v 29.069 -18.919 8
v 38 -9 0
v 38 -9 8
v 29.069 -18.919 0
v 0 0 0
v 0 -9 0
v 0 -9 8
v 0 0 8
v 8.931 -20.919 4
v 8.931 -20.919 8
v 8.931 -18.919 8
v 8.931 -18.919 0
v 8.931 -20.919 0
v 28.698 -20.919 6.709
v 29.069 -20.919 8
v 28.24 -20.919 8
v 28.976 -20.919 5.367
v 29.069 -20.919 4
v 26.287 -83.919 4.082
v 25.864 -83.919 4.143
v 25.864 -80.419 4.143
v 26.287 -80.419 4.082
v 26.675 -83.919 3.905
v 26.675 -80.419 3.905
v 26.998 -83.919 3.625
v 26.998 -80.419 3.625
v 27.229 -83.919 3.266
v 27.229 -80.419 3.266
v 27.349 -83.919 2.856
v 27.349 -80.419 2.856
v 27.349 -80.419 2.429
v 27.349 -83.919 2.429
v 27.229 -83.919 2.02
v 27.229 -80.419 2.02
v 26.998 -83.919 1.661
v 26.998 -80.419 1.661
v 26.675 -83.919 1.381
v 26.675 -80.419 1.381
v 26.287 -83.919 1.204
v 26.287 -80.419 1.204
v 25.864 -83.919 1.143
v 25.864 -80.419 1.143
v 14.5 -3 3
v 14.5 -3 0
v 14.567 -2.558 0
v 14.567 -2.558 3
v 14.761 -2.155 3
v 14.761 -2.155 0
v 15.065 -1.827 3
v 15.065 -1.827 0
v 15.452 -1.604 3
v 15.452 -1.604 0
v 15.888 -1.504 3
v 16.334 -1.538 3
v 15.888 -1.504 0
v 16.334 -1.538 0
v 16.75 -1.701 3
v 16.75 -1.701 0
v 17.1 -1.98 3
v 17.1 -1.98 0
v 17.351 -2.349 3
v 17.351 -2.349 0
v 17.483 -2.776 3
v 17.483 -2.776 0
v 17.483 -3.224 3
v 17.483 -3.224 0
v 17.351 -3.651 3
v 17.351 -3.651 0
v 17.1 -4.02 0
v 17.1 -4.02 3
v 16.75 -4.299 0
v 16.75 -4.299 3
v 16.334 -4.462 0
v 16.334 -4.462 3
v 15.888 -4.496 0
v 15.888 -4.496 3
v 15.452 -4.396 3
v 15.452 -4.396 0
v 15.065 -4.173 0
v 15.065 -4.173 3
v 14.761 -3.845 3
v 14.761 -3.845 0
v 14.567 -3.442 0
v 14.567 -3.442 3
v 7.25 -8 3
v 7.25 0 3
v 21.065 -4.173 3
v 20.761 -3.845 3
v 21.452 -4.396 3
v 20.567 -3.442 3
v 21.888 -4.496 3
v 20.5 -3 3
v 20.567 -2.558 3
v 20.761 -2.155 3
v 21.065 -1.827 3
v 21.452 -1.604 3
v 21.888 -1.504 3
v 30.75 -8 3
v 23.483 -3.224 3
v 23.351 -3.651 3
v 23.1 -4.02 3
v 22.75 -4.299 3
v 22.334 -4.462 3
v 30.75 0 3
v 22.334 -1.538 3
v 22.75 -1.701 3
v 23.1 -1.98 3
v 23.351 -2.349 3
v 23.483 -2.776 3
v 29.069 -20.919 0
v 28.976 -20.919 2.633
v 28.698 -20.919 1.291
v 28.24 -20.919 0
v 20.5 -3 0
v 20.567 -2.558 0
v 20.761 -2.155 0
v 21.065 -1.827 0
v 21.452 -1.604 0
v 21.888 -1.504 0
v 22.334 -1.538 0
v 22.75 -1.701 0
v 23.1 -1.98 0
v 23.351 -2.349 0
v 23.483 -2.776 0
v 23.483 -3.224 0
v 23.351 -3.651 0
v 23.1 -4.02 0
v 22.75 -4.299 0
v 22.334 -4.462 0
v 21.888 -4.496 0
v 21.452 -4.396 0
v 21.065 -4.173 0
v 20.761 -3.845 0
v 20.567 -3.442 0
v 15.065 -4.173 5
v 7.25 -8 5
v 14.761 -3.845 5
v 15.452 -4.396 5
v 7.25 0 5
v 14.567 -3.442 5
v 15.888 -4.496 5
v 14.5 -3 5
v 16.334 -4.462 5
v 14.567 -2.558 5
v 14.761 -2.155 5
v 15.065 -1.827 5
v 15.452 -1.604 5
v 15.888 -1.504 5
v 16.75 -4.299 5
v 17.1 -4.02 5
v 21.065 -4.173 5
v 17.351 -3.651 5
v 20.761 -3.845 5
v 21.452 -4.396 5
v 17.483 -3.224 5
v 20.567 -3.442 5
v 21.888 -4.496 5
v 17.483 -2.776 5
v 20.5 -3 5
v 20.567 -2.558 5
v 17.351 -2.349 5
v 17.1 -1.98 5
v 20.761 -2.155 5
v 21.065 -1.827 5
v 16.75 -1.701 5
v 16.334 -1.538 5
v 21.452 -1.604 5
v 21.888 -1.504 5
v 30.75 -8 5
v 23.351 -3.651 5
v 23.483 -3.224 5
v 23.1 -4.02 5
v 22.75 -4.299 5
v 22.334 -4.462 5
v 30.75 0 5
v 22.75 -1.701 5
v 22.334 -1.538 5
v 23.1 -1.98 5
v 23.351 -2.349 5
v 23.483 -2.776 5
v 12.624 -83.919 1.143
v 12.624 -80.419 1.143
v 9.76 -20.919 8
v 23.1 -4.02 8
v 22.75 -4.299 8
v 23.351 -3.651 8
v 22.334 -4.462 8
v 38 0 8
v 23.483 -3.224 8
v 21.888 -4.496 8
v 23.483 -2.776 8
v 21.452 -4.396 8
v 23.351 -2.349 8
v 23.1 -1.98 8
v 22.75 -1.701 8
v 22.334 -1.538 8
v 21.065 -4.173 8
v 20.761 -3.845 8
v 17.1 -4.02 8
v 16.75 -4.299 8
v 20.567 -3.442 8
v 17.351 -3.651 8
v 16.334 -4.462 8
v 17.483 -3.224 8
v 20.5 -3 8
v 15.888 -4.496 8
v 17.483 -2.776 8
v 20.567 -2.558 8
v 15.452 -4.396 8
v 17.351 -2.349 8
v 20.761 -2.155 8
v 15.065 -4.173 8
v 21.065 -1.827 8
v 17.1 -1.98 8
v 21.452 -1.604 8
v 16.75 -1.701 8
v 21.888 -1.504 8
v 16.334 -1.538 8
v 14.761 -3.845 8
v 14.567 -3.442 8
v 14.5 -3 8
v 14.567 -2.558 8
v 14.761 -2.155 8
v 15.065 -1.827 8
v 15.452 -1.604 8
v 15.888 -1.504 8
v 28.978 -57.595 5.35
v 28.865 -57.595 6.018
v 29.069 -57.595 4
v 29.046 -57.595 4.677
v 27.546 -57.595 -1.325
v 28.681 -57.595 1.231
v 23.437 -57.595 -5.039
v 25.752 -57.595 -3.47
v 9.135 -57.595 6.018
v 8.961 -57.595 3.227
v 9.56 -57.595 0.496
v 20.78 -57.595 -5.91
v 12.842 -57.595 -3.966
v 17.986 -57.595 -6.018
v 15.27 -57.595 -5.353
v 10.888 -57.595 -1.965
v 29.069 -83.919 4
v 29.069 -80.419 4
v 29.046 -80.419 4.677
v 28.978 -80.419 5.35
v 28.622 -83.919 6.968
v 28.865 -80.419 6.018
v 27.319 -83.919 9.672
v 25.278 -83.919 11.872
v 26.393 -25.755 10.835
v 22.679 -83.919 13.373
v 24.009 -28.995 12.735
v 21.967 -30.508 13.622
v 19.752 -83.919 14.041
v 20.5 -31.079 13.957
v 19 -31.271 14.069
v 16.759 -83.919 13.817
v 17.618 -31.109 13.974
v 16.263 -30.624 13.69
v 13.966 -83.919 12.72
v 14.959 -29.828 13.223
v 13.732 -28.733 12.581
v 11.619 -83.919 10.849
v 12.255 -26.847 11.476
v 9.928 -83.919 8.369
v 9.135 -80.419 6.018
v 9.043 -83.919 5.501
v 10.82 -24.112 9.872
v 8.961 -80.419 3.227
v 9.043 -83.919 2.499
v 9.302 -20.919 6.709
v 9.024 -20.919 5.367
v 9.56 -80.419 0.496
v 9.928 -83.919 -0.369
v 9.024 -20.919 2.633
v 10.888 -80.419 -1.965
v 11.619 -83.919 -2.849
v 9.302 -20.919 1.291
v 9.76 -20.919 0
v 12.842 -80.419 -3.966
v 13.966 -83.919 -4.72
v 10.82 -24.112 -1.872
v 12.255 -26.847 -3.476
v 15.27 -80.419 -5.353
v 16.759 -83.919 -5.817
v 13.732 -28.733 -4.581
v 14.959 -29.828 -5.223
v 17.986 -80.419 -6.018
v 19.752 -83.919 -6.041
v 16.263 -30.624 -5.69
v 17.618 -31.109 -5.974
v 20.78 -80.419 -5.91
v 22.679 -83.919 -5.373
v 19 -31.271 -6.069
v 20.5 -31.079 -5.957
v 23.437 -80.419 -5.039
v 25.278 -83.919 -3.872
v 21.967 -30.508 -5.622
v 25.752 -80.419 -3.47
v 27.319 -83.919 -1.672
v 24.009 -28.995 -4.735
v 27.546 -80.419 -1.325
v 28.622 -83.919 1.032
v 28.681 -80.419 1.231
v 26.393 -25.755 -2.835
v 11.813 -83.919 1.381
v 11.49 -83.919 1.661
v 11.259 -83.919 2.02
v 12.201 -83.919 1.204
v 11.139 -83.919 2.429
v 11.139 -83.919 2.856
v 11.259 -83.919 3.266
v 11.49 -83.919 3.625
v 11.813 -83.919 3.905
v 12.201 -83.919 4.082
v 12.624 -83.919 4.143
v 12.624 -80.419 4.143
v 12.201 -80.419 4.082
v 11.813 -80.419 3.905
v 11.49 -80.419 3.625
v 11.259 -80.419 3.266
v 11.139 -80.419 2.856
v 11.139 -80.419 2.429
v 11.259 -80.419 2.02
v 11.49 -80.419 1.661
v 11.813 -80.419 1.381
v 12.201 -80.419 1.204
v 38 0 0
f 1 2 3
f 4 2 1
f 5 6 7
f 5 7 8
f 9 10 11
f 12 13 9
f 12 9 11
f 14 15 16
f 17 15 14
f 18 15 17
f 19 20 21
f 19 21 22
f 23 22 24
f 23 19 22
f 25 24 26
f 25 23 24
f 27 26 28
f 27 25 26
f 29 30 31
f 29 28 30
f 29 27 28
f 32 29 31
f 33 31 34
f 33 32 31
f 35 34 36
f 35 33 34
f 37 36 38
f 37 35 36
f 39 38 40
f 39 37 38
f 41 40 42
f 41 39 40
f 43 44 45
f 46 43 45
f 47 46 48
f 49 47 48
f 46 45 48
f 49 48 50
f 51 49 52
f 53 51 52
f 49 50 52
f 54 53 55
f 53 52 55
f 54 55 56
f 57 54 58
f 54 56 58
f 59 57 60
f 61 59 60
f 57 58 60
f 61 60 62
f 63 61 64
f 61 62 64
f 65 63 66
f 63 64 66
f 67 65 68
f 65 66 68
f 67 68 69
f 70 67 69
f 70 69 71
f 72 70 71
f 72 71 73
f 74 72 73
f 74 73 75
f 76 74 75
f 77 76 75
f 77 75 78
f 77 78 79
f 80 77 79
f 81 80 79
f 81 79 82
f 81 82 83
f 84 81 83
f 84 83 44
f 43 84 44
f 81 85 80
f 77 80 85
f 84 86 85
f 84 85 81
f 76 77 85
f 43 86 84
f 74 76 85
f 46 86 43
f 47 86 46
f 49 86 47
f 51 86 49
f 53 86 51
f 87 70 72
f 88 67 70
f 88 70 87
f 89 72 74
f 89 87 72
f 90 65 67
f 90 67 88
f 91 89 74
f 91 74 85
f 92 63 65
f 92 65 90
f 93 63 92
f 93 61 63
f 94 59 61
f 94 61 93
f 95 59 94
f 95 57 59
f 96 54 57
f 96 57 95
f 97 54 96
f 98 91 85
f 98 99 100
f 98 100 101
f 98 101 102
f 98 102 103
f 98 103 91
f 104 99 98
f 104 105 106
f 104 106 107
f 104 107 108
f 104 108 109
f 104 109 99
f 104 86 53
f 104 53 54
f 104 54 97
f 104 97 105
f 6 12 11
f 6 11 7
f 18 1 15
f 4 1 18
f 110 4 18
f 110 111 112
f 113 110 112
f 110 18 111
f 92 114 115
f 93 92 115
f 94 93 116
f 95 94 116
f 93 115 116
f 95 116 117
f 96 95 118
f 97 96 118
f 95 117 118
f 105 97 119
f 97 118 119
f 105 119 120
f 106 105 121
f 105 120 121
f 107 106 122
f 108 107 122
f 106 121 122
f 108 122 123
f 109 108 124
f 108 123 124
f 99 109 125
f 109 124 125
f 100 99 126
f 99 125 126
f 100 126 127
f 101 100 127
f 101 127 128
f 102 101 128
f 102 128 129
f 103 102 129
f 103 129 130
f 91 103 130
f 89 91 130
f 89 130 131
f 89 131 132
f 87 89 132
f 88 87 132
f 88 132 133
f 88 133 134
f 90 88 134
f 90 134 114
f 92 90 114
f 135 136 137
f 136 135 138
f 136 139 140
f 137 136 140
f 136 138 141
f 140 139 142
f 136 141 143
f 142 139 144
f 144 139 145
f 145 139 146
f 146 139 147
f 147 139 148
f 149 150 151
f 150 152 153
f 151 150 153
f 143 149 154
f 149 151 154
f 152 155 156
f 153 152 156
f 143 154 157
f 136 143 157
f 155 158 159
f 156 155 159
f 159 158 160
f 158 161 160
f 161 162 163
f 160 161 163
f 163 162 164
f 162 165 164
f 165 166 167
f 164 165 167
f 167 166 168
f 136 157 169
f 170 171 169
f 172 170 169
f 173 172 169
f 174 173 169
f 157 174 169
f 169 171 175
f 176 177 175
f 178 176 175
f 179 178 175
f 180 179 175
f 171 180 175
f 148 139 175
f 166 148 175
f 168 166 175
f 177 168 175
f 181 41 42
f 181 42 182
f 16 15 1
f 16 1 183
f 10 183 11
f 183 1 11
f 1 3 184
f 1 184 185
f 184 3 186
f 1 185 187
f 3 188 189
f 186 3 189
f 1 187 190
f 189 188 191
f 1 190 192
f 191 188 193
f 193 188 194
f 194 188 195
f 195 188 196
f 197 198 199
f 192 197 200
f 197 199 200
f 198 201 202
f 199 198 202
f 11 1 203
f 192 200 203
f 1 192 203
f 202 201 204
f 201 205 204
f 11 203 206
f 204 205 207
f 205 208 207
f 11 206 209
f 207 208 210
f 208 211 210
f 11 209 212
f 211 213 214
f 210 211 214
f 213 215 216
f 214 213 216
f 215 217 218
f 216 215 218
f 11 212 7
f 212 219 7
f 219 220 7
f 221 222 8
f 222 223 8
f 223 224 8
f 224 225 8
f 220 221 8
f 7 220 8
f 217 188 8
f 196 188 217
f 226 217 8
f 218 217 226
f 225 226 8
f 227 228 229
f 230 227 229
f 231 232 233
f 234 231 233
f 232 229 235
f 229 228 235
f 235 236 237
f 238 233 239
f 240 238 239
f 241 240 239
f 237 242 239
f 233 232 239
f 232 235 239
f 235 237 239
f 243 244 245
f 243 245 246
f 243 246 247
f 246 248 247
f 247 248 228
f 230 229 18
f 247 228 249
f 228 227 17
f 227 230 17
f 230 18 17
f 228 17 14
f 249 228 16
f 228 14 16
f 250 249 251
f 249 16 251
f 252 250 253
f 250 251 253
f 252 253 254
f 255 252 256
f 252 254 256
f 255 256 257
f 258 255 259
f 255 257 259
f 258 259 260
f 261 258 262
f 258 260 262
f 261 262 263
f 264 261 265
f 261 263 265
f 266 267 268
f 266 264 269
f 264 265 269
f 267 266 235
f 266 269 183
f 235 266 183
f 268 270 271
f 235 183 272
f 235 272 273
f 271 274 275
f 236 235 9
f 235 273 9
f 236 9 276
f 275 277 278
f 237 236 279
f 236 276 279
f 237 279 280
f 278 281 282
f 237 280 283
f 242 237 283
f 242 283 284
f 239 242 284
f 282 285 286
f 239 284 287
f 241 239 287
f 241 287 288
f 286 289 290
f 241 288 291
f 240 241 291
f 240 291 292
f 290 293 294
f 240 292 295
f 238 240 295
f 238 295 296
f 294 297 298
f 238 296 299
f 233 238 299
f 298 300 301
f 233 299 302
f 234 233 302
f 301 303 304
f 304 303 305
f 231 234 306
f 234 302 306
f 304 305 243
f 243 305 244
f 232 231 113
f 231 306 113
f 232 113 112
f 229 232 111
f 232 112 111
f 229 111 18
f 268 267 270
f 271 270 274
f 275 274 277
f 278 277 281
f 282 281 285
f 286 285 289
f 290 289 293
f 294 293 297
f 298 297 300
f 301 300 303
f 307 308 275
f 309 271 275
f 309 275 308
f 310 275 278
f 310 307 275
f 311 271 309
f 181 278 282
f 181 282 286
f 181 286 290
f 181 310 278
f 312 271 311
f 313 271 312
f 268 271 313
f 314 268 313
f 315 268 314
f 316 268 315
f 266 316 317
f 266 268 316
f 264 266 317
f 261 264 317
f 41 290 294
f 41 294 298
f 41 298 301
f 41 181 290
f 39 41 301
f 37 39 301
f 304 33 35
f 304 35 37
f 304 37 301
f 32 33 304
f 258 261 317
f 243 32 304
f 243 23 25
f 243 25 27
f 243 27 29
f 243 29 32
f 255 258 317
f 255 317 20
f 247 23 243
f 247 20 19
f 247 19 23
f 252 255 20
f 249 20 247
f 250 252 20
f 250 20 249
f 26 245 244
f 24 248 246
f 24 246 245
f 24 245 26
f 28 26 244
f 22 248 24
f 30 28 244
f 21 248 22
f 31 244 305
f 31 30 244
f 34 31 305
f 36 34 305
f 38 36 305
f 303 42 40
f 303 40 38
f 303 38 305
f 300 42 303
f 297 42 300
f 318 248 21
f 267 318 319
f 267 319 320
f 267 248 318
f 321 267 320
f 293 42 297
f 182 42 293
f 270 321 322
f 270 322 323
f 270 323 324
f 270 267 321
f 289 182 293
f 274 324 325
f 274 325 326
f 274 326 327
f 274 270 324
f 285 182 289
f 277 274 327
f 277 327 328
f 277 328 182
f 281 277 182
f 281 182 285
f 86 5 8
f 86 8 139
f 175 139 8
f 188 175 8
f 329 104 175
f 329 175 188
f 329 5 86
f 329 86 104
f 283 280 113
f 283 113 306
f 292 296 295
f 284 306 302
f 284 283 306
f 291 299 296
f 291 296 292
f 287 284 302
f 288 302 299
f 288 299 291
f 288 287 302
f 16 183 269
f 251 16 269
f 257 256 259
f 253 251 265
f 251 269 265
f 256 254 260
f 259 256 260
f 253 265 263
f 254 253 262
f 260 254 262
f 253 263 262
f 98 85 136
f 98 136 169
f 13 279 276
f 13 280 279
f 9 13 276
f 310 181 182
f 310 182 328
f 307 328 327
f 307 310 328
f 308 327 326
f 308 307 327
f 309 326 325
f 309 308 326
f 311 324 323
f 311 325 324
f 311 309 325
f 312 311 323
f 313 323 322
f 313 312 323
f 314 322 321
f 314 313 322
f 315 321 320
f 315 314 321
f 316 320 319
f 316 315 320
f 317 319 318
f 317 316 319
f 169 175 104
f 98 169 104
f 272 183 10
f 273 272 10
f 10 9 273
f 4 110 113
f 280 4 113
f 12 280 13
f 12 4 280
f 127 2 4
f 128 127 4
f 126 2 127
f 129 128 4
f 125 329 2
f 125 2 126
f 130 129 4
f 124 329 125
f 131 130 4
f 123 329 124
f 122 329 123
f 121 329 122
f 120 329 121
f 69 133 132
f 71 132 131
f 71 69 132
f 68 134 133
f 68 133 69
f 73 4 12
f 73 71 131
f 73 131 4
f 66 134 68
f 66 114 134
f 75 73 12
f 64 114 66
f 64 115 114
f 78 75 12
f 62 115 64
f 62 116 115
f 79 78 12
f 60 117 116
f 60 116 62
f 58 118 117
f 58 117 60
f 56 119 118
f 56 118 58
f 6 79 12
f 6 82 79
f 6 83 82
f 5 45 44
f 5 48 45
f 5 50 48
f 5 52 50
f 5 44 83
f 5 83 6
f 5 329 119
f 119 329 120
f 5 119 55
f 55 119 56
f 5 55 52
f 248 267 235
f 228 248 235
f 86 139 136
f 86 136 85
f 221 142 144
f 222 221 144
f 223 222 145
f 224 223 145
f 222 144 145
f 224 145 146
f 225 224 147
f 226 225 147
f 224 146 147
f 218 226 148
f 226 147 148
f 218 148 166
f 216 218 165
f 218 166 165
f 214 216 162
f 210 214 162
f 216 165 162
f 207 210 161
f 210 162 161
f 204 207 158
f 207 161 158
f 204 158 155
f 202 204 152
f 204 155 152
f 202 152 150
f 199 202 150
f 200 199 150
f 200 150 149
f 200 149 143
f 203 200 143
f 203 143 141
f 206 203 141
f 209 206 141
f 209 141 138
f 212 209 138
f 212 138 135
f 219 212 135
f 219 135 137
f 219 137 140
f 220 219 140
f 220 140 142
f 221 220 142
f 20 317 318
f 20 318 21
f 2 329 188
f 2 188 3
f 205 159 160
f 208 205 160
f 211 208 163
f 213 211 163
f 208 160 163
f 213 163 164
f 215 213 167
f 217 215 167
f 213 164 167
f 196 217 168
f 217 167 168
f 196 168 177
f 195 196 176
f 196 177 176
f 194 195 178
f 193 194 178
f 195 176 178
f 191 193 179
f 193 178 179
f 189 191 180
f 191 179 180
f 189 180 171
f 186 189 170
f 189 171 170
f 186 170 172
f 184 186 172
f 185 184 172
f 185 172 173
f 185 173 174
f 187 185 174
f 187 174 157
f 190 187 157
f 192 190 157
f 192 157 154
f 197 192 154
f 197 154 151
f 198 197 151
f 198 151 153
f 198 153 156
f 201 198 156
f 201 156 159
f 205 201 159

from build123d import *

# Parameters (mm, degrees)
BOSS_EXTRUDE1_DEPTH = 8
SKETCH3_R           = 10.068967795
BOSS_EXTRUDE2_DEPTH = 63
CUT_EXTRUDE1_DEPTH  = 83
SKETCH7_R           = 1.5
CUT_EXTRUDE2_DEPTH  = 10
SKETCH9_W           = 23.5
SKETCH9_H           = 2
CUT_EXTRUDE3_DEPTH  = 8
SKETCH10_W          = 12.086915154
SKETCH10_H          = 22.82391002
CUT_EXTRUDE4_DEPTH  = 48
CUT_EXTRUDE5_DEPTH  = 14


with BuildPart() as part:
    # Sketch2 → Boss-Extrude1 (new body)
    with BuildSketch(Plane.XY):
        Polygon((0, 0), (38, 0), (38, -9), (29.068967795, -18.918916137), (29.068967795, -20.918916137), (8.931032205, -20.918916137), (8.931032205, -18.918916137), (0, -9), align=None)
    extrude(amount=BOSS_EXTRUDE1_DEPTH)

    # Sketch3 → Boss-Extrude2 (add)
    with BuildSketch(Plane.XZ.offset(20.918916137)):
        with Locations((19, 4)):
            Circle(SKETCH3_R)
    extrude(amount=BOSS_EXTRUDE2_DEPTH)

    # Sketch4 → Cut-Extrude1 (cut)
    with BuildSketch(Plane(origin=(0, 0, 0), x_dir=(0, 0, -1), z_dir=(1, 0, 0))):
        Polygon((0, -20.918916137), (6.068967795, -31.271096096), (6.068967795, -20.918916137), align=None)
        Polygon((-14.068967795, -20.918916137), (-8, -20.918916137), (-14.068967795, -31.271096096), align=None)
    extrude(amount=CUT_EXTRUDE1_DEPTH, mode=Mode.SUBTRACT)

    # Sketch7 → Cut-Extrude2 (cut)
    with BuildSketch(Plane(origin=(0, 0, 0), x_dir=(-1, 0, 0), z_dir=(0, 0, -1))):
        with Locations((-22, -3)):
            Circle(SKETCH7_R)
        with Locations((-16, -3)):
            Circle(SKETCH7_R)
    extrude(amount=-CUT_EXTRUDE2_DEPTH, mode=Mode.SUBTRACT)

    # Sketch9 → Cut-Extrude3 (cut)
    with BuildSketch(Plane(origin=(0, 0, 0), x_dir=(1, 0, 0), z_dir=(0, 1, 0))):
        with Locations((19, -4)):
            Rectangle(SKETCH9_W, SKETCH9_H)
    extrude(amount=-CUT_EXTRUDE3_DEPTH, mode=Mode.SUBTRACT)

    # Sketch10 → Cut-Extrude4 (cut)
    with BuildSketch(Plane(origin=(0, 0, 0), x_dir=(0, 0, -1), z_dir=(1, 0, 0))):
        with Locations((0.025510218, -69.006961127)):
            Rectangle(SKETCH10_W, SKETCH10_H)
    extrude(amount=CUT_EXTRUDE4_DEPTH, mode=Mode.SUBTRACT)

    # Sketch12 → Cut-Extrude5 (cut)
    with BuildSketch(Plane.XZ.offset(83.918916137)):
        with BuildLine():
            Line((12.623924181, 4.142800634), (25.864458584, 4.142800634))
            ThreePointArc((25.864458584, 4.142800634), (27.364458584, 2.642800634), (25.864458584, 1.142800634))
            Line((25.864458584, 1.142800634), (12.623924181, 1.142800634))
            ThreePointArc((12.623924181, 1.142800634), (11.123924181, 2.642800634), (12.623924181, 4.142800634))
        make_face()
    extrude(amount=-CUT_EXTRUDE5_DEPTH, mode=Mode.SUBTRACT)


solid = part.part
